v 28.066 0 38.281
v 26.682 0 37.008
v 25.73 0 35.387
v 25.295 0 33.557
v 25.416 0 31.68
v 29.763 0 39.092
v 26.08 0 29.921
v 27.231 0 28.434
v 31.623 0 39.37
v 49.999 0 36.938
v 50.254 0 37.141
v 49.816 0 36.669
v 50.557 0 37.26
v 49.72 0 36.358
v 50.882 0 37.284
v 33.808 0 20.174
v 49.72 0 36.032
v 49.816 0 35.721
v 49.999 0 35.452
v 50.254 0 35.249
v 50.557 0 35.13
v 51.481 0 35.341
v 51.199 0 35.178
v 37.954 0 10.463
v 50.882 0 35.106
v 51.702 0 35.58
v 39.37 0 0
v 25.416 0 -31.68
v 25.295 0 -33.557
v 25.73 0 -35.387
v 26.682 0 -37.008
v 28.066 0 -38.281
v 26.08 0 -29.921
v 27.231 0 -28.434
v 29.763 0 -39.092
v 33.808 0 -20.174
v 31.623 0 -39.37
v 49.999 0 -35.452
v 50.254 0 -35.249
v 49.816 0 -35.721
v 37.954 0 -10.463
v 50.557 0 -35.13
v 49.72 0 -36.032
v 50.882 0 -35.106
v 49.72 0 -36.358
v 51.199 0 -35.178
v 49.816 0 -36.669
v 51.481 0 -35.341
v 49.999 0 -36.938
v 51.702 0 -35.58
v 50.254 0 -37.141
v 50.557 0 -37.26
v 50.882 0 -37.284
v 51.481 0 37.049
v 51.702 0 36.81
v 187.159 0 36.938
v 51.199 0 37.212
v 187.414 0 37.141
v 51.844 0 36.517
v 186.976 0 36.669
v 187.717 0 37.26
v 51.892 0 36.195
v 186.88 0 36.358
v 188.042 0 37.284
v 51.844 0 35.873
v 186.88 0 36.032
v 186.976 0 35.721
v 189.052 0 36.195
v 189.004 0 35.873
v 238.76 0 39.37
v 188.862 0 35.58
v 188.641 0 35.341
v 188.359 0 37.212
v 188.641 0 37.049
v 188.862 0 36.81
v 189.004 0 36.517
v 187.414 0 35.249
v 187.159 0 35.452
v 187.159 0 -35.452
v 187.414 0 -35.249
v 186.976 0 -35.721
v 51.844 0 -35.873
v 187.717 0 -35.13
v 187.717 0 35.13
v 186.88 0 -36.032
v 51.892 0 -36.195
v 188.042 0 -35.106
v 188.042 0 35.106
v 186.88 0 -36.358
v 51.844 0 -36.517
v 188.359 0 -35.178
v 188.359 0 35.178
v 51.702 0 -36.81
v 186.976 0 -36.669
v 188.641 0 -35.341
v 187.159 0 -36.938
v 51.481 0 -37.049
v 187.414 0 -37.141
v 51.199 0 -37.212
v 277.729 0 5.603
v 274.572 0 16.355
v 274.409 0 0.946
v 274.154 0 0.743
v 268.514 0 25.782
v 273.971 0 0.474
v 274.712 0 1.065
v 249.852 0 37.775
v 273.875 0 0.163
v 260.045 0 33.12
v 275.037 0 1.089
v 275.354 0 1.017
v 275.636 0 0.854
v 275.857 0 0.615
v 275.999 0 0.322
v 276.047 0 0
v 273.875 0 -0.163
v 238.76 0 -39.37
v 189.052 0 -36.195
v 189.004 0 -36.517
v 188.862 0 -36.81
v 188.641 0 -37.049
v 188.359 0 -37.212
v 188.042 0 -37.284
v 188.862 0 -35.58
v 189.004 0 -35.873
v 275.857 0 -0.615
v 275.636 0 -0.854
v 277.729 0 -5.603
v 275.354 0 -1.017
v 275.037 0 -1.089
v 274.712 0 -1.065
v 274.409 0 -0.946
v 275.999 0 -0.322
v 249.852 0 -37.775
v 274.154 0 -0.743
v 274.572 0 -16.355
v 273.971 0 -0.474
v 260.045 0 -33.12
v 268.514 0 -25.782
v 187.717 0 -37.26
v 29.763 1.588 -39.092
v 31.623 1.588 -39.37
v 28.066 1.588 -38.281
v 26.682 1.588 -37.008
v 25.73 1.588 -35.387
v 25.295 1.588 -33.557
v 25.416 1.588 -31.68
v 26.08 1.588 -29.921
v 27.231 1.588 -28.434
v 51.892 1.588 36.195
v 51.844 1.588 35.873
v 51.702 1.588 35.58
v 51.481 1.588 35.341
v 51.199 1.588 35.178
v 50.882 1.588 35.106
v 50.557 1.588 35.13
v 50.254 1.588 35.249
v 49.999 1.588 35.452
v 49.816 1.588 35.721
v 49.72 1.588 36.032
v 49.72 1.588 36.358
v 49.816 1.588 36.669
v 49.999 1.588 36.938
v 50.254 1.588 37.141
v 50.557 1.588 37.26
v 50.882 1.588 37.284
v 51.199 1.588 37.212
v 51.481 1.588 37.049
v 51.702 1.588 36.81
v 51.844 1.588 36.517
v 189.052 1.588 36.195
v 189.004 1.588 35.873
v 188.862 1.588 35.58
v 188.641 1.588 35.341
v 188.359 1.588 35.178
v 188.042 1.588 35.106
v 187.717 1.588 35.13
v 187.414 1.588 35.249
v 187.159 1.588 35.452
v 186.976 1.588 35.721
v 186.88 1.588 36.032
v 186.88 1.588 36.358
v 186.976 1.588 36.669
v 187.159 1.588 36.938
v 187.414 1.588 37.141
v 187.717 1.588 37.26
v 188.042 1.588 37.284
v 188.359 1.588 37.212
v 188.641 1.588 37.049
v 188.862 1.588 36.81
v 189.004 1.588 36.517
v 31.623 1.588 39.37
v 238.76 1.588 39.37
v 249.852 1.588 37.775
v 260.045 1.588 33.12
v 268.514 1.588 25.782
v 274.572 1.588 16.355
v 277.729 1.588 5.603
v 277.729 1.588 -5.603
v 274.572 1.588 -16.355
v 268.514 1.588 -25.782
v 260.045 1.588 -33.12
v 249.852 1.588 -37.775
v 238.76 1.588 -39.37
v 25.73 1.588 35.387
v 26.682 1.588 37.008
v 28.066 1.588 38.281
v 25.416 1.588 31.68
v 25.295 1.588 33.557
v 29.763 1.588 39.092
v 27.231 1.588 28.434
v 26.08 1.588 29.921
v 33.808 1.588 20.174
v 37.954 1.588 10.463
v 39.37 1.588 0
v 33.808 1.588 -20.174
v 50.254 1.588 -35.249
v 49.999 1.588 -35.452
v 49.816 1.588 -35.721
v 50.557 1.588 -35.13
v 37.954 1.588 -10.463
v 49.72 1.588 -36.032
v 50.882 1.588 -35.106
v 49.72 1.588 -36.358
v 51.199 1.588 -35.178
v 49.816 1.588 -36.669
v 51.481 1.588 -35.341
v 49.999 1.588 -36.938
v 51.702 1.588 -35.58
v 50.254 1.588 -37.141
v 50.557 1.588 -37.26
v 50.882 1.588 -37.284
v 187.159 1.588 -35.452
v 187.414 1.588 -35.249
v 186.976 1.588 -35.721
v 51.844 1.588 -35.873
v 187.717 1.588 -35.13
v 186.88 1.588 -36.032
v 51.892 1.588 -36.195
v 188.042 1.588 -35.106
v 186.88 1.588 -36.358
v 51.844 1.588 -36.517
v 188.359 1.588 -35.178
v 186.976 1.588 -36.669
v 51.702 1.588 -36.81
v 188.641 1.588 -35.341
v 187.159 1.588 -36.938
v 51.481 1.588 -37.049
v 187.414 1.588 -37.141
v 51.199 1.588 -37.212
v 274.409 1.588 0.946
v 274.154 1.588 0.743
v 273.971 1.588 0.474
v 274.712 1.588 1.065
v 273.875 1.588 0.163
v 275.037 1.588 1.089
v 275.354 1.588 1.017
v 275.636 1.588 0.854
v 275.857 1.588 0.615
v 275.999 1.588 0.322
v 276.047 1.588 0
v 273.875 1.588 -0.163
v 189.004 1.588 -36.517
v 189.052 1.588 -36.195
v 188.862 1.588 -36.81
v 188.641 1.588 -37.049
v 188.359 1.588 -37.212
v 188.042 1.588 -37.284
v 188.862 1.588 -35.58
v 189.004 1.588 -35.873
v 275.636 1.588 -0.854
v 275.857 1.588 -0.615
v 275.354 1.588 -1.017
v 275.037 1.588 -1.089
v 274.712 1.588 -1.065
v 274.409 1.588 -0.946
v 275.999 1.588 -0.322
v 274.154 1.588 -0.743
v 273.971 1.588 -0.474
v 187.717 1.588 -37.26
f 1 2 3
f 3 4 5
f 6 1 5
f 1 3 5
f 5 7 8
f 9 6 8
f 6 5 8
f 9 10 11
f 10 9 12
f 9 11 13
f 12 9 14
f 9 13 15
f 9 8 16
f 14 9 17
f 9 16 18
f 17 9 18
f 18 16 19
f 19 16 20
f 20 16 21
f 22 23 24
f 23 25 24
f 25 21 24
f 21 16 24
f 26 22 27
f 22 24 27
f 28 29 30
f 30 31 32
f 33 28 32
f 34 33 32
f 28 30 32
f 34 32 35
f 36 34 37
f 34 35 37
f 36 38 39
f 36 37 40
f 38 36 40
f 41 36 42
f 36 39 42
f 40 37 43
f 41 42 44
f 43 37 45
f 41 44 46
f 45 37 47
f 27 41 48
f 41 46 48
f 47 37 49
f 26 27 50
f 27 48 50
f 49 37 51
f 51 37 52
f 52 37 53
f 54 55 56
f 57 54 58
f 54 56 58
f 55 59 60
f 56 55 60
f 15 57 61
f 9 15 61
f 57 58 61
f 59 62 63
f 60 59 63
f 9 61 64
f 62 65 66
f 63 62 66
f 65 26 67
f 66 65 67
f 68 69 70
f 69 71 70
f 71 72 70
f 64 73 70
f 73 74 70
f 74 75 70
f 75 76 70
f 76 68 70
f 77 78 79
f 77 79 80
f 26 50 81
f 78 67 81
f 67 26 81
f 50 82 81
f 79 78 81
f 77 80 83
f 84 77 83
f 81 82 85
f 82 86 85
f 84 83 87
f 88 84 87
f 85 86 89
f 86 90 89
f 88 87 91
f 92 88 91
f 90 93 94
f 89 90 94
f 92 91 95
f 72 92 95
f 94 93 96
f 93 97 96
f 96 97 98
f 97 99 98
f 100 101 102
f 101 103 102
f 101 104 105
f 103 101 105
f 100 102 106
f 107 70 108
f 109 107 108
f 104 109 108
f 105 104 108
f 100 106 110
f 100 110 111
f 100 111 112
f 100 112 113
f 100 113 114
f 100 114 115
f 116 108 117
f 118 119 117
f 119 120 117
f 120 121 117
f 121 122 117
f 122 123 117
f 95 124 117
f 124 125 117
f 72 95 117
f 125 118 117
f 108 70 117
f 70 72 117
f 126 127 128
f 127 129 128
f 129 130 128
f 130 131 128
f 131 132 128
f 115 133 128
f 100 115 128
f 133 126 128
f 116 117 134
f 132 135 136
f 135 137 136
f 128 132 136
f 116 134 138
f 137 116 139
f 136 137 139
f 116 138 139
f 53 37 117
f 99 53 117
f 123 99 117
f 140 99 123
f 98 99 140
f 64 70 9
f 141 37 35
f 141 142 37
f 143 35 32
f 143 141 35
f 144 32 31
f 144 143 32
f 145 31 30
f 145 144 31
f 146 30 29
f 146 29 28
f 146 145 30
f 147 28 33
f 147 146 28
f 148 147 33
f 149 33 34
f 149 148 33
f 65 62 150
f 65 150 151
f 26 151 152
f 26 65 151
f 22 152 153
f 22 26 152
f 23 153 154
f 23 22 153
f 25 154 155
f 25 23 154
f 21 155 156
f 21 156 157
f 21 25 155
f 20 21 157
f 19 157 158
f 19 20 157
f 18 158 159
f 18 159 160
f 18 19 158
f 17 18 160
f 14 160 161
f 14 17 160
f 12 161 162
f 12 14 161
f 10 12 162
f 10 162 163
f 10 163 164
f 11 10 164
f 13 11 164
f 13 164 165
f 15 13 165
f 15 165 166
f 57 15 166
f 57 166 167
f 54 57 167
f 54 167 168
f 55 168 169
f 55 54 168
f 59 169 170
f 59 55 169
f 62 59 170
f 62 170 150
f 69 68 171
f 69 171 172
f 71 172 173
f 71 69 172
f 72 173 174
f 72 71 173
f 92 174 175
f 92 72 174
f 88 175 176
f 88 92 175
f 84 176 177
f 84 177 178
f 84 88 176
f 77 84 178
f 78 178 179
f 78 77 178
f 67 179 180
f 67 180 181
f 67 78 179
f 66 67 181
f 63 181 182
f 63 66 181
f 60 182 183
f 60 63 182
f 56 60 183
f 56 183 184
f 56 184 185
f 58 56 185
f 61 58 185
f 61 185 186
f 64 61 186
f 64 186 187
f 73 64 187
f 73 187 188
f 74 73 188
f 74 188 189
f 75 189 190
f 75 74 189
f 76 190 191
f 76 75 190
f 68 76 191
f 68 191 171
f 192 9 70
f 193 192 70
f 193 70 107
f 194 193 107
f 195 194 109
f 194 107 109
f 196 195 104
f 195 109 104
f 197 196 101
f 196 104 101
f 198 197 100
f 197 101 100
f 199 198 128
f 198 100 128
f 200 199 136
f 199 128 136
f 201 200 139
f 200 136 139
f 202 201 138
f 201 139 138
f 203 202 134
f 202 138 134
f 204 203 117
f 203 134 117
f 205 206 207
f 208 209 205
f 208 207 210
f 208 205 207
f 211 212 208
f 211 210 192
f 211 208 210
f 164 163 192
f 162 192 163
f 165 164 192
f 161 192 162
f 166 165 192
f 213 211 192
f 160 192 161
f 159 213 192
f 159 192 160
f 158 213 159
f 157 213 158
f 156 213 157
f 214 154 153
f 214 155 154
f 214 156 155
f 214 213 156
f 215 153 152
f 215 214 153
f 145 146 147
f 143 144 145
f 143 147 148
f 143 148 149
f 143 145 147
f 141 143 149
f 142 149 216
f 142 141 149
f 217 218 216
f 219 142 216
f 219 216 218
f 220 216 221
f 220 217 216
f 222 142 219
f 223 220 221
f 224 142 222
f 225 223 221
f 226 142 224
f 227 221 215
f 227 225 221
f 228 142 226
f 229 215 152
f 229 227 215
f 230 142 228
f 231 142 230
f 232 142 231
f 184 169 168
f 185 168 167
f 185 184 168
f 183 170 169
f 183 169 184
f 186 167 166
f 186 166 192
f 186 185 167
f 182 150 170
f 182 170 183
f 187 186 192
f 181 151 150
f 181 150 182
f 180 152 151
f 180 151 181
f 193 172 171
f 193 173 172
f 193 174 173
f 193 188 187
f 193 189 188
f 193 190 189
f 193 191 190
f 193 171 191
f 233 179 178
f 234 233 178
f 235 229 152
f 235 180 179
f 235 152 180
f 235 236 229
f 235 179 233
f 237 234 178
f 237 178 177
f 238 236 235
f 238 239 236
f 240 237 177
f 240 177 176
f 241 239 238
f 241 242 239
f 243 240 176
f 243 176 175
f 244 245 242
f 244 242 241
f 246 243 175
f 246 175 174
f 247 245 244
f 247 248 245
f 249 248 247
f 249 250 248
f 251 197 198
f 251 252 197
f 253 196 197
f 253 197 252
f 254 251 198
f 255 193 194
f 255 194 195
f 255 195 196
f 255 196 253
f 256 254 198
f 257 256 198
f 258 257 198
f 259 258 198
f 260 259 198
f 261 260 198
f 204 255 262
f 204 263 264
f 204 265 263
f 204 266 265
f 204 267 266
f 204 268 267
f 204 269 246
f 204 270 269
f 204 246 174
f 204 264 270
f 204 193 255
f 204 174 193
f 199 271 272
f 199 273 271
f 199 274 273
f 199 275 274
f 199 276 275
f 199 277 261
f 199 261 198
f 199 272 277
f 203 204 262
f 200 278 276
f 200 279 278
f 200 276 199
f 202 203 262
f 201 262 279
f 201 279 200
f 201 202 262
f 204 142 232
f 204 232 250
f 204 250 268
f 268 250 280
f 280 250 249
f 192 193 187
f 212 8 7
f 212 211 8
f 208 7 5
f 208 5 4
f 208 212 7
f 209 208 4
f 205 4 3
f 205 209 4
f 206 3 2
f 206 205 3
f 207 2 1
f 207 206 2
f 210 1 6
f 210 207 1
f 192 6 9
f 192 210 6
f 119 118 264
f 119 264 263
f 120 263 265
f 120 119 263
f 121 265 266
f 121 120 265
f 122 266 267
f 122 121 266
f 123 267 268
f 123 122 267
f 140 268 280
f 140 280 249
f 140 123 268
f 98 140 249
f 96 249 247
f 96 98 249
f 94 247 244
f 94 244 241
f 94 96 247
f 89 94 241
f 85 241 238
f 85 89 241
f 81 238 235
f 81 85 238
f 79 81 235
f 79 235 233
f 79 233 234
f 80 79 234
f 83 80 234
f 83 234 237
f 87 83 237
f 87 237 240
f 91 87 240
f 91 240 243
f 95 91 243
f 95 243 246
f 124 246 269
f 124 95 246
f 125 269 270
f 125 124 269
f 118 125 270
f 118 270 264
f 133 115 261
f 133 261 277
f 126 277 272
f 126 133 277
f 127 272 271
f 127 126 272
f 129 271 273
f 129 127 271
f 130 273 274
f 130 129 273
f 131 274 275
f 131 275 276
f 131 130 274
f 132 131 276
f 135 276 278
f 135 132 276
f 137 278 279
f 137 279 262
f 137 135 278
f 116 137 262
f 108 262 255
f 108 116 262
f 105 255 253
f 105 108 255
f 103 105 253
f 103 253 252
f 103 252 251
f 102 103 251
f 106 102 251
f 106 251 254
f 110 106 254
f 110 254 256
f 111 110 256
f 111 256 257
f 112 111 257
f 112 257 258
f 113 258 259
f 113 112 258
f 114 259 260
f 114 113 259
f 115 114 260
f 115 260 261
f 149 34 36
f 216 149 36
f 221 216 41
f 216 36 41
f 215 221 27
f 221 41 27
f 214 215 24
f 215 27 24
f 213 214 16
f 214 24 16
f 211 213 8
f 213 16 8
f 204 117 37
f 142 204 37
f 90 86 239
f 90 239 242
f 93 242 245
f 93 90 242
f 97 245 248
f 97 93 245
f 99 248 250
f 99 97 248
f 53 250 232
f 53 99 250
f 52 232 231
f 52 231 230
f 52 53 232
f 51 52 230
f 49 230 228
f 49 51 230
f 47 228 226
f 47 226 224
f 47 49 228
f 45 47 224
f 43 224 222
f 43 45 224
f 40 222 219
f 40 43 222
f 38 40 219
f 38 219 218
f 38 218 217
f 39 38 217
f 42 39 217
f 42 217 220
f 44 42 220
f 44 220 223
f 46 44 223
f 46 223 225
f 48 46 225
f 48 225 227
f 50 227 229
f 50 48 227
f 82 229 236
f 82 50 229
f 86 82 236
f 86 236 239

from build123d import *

# Parameters (mm, degrees)
SKETCH1_R           = 1.0922
BOSS_EXTRUDE1_DEPTH = 1.5875
FILLET1_R           = 6.35


with BuildPart() as part:
    # Sketch1 → Boss-Extrude1 (new body)
    with BuildSketch(Plane(origin=(0, 0, 0), x_dir=(1, 0, 0), z_dir=(0, 1, 0))):
        with BuildLine():
            Line((238.76, 39.37), (0, 39.37))
            ThreePointArc((0, 39.37), (39.37, 0), (0, -39.37))
            Line((0, -39.37), (238.76, -39.37))
            ThreePointArc((238.76, -39.37), (278.13, 0), (238.76, 39.37))
        make_face()
        with Locations((274.955, 0)):
            Circle(SKETCH1_R, mode=Mode.SUBTRACT)
        with Locations((187.96, 36.195)):
            Circle(SKETCH1_R, mode=Mode.SUBTRACT)
        with Locations((50.8, 36.195)):
            Circle(SKETCH1_R, mode=Mode.SUBTRACT)
        with Locations((50.8, -36.195)):
            Circle(SKETCH1_R, mode=Mode.SUBTRACT)
        with Locations((187.96, -36.195)):
            Circle(SKETCH1_R, mode=Mode.SUBTRACT)
    extrude(amount=BOSS_EXTRUDE1_DEPTH)

    # Fillet1
    fillet1_edges = [part.edges().sort_by_distance(p)[0] for p in [
        (0, 0.79375, 39.37),
        (0, 0.79375, -39.37),
    ]]
    fillet(fillet1_edges, radius=FILLET1_R)


solid = part.part
